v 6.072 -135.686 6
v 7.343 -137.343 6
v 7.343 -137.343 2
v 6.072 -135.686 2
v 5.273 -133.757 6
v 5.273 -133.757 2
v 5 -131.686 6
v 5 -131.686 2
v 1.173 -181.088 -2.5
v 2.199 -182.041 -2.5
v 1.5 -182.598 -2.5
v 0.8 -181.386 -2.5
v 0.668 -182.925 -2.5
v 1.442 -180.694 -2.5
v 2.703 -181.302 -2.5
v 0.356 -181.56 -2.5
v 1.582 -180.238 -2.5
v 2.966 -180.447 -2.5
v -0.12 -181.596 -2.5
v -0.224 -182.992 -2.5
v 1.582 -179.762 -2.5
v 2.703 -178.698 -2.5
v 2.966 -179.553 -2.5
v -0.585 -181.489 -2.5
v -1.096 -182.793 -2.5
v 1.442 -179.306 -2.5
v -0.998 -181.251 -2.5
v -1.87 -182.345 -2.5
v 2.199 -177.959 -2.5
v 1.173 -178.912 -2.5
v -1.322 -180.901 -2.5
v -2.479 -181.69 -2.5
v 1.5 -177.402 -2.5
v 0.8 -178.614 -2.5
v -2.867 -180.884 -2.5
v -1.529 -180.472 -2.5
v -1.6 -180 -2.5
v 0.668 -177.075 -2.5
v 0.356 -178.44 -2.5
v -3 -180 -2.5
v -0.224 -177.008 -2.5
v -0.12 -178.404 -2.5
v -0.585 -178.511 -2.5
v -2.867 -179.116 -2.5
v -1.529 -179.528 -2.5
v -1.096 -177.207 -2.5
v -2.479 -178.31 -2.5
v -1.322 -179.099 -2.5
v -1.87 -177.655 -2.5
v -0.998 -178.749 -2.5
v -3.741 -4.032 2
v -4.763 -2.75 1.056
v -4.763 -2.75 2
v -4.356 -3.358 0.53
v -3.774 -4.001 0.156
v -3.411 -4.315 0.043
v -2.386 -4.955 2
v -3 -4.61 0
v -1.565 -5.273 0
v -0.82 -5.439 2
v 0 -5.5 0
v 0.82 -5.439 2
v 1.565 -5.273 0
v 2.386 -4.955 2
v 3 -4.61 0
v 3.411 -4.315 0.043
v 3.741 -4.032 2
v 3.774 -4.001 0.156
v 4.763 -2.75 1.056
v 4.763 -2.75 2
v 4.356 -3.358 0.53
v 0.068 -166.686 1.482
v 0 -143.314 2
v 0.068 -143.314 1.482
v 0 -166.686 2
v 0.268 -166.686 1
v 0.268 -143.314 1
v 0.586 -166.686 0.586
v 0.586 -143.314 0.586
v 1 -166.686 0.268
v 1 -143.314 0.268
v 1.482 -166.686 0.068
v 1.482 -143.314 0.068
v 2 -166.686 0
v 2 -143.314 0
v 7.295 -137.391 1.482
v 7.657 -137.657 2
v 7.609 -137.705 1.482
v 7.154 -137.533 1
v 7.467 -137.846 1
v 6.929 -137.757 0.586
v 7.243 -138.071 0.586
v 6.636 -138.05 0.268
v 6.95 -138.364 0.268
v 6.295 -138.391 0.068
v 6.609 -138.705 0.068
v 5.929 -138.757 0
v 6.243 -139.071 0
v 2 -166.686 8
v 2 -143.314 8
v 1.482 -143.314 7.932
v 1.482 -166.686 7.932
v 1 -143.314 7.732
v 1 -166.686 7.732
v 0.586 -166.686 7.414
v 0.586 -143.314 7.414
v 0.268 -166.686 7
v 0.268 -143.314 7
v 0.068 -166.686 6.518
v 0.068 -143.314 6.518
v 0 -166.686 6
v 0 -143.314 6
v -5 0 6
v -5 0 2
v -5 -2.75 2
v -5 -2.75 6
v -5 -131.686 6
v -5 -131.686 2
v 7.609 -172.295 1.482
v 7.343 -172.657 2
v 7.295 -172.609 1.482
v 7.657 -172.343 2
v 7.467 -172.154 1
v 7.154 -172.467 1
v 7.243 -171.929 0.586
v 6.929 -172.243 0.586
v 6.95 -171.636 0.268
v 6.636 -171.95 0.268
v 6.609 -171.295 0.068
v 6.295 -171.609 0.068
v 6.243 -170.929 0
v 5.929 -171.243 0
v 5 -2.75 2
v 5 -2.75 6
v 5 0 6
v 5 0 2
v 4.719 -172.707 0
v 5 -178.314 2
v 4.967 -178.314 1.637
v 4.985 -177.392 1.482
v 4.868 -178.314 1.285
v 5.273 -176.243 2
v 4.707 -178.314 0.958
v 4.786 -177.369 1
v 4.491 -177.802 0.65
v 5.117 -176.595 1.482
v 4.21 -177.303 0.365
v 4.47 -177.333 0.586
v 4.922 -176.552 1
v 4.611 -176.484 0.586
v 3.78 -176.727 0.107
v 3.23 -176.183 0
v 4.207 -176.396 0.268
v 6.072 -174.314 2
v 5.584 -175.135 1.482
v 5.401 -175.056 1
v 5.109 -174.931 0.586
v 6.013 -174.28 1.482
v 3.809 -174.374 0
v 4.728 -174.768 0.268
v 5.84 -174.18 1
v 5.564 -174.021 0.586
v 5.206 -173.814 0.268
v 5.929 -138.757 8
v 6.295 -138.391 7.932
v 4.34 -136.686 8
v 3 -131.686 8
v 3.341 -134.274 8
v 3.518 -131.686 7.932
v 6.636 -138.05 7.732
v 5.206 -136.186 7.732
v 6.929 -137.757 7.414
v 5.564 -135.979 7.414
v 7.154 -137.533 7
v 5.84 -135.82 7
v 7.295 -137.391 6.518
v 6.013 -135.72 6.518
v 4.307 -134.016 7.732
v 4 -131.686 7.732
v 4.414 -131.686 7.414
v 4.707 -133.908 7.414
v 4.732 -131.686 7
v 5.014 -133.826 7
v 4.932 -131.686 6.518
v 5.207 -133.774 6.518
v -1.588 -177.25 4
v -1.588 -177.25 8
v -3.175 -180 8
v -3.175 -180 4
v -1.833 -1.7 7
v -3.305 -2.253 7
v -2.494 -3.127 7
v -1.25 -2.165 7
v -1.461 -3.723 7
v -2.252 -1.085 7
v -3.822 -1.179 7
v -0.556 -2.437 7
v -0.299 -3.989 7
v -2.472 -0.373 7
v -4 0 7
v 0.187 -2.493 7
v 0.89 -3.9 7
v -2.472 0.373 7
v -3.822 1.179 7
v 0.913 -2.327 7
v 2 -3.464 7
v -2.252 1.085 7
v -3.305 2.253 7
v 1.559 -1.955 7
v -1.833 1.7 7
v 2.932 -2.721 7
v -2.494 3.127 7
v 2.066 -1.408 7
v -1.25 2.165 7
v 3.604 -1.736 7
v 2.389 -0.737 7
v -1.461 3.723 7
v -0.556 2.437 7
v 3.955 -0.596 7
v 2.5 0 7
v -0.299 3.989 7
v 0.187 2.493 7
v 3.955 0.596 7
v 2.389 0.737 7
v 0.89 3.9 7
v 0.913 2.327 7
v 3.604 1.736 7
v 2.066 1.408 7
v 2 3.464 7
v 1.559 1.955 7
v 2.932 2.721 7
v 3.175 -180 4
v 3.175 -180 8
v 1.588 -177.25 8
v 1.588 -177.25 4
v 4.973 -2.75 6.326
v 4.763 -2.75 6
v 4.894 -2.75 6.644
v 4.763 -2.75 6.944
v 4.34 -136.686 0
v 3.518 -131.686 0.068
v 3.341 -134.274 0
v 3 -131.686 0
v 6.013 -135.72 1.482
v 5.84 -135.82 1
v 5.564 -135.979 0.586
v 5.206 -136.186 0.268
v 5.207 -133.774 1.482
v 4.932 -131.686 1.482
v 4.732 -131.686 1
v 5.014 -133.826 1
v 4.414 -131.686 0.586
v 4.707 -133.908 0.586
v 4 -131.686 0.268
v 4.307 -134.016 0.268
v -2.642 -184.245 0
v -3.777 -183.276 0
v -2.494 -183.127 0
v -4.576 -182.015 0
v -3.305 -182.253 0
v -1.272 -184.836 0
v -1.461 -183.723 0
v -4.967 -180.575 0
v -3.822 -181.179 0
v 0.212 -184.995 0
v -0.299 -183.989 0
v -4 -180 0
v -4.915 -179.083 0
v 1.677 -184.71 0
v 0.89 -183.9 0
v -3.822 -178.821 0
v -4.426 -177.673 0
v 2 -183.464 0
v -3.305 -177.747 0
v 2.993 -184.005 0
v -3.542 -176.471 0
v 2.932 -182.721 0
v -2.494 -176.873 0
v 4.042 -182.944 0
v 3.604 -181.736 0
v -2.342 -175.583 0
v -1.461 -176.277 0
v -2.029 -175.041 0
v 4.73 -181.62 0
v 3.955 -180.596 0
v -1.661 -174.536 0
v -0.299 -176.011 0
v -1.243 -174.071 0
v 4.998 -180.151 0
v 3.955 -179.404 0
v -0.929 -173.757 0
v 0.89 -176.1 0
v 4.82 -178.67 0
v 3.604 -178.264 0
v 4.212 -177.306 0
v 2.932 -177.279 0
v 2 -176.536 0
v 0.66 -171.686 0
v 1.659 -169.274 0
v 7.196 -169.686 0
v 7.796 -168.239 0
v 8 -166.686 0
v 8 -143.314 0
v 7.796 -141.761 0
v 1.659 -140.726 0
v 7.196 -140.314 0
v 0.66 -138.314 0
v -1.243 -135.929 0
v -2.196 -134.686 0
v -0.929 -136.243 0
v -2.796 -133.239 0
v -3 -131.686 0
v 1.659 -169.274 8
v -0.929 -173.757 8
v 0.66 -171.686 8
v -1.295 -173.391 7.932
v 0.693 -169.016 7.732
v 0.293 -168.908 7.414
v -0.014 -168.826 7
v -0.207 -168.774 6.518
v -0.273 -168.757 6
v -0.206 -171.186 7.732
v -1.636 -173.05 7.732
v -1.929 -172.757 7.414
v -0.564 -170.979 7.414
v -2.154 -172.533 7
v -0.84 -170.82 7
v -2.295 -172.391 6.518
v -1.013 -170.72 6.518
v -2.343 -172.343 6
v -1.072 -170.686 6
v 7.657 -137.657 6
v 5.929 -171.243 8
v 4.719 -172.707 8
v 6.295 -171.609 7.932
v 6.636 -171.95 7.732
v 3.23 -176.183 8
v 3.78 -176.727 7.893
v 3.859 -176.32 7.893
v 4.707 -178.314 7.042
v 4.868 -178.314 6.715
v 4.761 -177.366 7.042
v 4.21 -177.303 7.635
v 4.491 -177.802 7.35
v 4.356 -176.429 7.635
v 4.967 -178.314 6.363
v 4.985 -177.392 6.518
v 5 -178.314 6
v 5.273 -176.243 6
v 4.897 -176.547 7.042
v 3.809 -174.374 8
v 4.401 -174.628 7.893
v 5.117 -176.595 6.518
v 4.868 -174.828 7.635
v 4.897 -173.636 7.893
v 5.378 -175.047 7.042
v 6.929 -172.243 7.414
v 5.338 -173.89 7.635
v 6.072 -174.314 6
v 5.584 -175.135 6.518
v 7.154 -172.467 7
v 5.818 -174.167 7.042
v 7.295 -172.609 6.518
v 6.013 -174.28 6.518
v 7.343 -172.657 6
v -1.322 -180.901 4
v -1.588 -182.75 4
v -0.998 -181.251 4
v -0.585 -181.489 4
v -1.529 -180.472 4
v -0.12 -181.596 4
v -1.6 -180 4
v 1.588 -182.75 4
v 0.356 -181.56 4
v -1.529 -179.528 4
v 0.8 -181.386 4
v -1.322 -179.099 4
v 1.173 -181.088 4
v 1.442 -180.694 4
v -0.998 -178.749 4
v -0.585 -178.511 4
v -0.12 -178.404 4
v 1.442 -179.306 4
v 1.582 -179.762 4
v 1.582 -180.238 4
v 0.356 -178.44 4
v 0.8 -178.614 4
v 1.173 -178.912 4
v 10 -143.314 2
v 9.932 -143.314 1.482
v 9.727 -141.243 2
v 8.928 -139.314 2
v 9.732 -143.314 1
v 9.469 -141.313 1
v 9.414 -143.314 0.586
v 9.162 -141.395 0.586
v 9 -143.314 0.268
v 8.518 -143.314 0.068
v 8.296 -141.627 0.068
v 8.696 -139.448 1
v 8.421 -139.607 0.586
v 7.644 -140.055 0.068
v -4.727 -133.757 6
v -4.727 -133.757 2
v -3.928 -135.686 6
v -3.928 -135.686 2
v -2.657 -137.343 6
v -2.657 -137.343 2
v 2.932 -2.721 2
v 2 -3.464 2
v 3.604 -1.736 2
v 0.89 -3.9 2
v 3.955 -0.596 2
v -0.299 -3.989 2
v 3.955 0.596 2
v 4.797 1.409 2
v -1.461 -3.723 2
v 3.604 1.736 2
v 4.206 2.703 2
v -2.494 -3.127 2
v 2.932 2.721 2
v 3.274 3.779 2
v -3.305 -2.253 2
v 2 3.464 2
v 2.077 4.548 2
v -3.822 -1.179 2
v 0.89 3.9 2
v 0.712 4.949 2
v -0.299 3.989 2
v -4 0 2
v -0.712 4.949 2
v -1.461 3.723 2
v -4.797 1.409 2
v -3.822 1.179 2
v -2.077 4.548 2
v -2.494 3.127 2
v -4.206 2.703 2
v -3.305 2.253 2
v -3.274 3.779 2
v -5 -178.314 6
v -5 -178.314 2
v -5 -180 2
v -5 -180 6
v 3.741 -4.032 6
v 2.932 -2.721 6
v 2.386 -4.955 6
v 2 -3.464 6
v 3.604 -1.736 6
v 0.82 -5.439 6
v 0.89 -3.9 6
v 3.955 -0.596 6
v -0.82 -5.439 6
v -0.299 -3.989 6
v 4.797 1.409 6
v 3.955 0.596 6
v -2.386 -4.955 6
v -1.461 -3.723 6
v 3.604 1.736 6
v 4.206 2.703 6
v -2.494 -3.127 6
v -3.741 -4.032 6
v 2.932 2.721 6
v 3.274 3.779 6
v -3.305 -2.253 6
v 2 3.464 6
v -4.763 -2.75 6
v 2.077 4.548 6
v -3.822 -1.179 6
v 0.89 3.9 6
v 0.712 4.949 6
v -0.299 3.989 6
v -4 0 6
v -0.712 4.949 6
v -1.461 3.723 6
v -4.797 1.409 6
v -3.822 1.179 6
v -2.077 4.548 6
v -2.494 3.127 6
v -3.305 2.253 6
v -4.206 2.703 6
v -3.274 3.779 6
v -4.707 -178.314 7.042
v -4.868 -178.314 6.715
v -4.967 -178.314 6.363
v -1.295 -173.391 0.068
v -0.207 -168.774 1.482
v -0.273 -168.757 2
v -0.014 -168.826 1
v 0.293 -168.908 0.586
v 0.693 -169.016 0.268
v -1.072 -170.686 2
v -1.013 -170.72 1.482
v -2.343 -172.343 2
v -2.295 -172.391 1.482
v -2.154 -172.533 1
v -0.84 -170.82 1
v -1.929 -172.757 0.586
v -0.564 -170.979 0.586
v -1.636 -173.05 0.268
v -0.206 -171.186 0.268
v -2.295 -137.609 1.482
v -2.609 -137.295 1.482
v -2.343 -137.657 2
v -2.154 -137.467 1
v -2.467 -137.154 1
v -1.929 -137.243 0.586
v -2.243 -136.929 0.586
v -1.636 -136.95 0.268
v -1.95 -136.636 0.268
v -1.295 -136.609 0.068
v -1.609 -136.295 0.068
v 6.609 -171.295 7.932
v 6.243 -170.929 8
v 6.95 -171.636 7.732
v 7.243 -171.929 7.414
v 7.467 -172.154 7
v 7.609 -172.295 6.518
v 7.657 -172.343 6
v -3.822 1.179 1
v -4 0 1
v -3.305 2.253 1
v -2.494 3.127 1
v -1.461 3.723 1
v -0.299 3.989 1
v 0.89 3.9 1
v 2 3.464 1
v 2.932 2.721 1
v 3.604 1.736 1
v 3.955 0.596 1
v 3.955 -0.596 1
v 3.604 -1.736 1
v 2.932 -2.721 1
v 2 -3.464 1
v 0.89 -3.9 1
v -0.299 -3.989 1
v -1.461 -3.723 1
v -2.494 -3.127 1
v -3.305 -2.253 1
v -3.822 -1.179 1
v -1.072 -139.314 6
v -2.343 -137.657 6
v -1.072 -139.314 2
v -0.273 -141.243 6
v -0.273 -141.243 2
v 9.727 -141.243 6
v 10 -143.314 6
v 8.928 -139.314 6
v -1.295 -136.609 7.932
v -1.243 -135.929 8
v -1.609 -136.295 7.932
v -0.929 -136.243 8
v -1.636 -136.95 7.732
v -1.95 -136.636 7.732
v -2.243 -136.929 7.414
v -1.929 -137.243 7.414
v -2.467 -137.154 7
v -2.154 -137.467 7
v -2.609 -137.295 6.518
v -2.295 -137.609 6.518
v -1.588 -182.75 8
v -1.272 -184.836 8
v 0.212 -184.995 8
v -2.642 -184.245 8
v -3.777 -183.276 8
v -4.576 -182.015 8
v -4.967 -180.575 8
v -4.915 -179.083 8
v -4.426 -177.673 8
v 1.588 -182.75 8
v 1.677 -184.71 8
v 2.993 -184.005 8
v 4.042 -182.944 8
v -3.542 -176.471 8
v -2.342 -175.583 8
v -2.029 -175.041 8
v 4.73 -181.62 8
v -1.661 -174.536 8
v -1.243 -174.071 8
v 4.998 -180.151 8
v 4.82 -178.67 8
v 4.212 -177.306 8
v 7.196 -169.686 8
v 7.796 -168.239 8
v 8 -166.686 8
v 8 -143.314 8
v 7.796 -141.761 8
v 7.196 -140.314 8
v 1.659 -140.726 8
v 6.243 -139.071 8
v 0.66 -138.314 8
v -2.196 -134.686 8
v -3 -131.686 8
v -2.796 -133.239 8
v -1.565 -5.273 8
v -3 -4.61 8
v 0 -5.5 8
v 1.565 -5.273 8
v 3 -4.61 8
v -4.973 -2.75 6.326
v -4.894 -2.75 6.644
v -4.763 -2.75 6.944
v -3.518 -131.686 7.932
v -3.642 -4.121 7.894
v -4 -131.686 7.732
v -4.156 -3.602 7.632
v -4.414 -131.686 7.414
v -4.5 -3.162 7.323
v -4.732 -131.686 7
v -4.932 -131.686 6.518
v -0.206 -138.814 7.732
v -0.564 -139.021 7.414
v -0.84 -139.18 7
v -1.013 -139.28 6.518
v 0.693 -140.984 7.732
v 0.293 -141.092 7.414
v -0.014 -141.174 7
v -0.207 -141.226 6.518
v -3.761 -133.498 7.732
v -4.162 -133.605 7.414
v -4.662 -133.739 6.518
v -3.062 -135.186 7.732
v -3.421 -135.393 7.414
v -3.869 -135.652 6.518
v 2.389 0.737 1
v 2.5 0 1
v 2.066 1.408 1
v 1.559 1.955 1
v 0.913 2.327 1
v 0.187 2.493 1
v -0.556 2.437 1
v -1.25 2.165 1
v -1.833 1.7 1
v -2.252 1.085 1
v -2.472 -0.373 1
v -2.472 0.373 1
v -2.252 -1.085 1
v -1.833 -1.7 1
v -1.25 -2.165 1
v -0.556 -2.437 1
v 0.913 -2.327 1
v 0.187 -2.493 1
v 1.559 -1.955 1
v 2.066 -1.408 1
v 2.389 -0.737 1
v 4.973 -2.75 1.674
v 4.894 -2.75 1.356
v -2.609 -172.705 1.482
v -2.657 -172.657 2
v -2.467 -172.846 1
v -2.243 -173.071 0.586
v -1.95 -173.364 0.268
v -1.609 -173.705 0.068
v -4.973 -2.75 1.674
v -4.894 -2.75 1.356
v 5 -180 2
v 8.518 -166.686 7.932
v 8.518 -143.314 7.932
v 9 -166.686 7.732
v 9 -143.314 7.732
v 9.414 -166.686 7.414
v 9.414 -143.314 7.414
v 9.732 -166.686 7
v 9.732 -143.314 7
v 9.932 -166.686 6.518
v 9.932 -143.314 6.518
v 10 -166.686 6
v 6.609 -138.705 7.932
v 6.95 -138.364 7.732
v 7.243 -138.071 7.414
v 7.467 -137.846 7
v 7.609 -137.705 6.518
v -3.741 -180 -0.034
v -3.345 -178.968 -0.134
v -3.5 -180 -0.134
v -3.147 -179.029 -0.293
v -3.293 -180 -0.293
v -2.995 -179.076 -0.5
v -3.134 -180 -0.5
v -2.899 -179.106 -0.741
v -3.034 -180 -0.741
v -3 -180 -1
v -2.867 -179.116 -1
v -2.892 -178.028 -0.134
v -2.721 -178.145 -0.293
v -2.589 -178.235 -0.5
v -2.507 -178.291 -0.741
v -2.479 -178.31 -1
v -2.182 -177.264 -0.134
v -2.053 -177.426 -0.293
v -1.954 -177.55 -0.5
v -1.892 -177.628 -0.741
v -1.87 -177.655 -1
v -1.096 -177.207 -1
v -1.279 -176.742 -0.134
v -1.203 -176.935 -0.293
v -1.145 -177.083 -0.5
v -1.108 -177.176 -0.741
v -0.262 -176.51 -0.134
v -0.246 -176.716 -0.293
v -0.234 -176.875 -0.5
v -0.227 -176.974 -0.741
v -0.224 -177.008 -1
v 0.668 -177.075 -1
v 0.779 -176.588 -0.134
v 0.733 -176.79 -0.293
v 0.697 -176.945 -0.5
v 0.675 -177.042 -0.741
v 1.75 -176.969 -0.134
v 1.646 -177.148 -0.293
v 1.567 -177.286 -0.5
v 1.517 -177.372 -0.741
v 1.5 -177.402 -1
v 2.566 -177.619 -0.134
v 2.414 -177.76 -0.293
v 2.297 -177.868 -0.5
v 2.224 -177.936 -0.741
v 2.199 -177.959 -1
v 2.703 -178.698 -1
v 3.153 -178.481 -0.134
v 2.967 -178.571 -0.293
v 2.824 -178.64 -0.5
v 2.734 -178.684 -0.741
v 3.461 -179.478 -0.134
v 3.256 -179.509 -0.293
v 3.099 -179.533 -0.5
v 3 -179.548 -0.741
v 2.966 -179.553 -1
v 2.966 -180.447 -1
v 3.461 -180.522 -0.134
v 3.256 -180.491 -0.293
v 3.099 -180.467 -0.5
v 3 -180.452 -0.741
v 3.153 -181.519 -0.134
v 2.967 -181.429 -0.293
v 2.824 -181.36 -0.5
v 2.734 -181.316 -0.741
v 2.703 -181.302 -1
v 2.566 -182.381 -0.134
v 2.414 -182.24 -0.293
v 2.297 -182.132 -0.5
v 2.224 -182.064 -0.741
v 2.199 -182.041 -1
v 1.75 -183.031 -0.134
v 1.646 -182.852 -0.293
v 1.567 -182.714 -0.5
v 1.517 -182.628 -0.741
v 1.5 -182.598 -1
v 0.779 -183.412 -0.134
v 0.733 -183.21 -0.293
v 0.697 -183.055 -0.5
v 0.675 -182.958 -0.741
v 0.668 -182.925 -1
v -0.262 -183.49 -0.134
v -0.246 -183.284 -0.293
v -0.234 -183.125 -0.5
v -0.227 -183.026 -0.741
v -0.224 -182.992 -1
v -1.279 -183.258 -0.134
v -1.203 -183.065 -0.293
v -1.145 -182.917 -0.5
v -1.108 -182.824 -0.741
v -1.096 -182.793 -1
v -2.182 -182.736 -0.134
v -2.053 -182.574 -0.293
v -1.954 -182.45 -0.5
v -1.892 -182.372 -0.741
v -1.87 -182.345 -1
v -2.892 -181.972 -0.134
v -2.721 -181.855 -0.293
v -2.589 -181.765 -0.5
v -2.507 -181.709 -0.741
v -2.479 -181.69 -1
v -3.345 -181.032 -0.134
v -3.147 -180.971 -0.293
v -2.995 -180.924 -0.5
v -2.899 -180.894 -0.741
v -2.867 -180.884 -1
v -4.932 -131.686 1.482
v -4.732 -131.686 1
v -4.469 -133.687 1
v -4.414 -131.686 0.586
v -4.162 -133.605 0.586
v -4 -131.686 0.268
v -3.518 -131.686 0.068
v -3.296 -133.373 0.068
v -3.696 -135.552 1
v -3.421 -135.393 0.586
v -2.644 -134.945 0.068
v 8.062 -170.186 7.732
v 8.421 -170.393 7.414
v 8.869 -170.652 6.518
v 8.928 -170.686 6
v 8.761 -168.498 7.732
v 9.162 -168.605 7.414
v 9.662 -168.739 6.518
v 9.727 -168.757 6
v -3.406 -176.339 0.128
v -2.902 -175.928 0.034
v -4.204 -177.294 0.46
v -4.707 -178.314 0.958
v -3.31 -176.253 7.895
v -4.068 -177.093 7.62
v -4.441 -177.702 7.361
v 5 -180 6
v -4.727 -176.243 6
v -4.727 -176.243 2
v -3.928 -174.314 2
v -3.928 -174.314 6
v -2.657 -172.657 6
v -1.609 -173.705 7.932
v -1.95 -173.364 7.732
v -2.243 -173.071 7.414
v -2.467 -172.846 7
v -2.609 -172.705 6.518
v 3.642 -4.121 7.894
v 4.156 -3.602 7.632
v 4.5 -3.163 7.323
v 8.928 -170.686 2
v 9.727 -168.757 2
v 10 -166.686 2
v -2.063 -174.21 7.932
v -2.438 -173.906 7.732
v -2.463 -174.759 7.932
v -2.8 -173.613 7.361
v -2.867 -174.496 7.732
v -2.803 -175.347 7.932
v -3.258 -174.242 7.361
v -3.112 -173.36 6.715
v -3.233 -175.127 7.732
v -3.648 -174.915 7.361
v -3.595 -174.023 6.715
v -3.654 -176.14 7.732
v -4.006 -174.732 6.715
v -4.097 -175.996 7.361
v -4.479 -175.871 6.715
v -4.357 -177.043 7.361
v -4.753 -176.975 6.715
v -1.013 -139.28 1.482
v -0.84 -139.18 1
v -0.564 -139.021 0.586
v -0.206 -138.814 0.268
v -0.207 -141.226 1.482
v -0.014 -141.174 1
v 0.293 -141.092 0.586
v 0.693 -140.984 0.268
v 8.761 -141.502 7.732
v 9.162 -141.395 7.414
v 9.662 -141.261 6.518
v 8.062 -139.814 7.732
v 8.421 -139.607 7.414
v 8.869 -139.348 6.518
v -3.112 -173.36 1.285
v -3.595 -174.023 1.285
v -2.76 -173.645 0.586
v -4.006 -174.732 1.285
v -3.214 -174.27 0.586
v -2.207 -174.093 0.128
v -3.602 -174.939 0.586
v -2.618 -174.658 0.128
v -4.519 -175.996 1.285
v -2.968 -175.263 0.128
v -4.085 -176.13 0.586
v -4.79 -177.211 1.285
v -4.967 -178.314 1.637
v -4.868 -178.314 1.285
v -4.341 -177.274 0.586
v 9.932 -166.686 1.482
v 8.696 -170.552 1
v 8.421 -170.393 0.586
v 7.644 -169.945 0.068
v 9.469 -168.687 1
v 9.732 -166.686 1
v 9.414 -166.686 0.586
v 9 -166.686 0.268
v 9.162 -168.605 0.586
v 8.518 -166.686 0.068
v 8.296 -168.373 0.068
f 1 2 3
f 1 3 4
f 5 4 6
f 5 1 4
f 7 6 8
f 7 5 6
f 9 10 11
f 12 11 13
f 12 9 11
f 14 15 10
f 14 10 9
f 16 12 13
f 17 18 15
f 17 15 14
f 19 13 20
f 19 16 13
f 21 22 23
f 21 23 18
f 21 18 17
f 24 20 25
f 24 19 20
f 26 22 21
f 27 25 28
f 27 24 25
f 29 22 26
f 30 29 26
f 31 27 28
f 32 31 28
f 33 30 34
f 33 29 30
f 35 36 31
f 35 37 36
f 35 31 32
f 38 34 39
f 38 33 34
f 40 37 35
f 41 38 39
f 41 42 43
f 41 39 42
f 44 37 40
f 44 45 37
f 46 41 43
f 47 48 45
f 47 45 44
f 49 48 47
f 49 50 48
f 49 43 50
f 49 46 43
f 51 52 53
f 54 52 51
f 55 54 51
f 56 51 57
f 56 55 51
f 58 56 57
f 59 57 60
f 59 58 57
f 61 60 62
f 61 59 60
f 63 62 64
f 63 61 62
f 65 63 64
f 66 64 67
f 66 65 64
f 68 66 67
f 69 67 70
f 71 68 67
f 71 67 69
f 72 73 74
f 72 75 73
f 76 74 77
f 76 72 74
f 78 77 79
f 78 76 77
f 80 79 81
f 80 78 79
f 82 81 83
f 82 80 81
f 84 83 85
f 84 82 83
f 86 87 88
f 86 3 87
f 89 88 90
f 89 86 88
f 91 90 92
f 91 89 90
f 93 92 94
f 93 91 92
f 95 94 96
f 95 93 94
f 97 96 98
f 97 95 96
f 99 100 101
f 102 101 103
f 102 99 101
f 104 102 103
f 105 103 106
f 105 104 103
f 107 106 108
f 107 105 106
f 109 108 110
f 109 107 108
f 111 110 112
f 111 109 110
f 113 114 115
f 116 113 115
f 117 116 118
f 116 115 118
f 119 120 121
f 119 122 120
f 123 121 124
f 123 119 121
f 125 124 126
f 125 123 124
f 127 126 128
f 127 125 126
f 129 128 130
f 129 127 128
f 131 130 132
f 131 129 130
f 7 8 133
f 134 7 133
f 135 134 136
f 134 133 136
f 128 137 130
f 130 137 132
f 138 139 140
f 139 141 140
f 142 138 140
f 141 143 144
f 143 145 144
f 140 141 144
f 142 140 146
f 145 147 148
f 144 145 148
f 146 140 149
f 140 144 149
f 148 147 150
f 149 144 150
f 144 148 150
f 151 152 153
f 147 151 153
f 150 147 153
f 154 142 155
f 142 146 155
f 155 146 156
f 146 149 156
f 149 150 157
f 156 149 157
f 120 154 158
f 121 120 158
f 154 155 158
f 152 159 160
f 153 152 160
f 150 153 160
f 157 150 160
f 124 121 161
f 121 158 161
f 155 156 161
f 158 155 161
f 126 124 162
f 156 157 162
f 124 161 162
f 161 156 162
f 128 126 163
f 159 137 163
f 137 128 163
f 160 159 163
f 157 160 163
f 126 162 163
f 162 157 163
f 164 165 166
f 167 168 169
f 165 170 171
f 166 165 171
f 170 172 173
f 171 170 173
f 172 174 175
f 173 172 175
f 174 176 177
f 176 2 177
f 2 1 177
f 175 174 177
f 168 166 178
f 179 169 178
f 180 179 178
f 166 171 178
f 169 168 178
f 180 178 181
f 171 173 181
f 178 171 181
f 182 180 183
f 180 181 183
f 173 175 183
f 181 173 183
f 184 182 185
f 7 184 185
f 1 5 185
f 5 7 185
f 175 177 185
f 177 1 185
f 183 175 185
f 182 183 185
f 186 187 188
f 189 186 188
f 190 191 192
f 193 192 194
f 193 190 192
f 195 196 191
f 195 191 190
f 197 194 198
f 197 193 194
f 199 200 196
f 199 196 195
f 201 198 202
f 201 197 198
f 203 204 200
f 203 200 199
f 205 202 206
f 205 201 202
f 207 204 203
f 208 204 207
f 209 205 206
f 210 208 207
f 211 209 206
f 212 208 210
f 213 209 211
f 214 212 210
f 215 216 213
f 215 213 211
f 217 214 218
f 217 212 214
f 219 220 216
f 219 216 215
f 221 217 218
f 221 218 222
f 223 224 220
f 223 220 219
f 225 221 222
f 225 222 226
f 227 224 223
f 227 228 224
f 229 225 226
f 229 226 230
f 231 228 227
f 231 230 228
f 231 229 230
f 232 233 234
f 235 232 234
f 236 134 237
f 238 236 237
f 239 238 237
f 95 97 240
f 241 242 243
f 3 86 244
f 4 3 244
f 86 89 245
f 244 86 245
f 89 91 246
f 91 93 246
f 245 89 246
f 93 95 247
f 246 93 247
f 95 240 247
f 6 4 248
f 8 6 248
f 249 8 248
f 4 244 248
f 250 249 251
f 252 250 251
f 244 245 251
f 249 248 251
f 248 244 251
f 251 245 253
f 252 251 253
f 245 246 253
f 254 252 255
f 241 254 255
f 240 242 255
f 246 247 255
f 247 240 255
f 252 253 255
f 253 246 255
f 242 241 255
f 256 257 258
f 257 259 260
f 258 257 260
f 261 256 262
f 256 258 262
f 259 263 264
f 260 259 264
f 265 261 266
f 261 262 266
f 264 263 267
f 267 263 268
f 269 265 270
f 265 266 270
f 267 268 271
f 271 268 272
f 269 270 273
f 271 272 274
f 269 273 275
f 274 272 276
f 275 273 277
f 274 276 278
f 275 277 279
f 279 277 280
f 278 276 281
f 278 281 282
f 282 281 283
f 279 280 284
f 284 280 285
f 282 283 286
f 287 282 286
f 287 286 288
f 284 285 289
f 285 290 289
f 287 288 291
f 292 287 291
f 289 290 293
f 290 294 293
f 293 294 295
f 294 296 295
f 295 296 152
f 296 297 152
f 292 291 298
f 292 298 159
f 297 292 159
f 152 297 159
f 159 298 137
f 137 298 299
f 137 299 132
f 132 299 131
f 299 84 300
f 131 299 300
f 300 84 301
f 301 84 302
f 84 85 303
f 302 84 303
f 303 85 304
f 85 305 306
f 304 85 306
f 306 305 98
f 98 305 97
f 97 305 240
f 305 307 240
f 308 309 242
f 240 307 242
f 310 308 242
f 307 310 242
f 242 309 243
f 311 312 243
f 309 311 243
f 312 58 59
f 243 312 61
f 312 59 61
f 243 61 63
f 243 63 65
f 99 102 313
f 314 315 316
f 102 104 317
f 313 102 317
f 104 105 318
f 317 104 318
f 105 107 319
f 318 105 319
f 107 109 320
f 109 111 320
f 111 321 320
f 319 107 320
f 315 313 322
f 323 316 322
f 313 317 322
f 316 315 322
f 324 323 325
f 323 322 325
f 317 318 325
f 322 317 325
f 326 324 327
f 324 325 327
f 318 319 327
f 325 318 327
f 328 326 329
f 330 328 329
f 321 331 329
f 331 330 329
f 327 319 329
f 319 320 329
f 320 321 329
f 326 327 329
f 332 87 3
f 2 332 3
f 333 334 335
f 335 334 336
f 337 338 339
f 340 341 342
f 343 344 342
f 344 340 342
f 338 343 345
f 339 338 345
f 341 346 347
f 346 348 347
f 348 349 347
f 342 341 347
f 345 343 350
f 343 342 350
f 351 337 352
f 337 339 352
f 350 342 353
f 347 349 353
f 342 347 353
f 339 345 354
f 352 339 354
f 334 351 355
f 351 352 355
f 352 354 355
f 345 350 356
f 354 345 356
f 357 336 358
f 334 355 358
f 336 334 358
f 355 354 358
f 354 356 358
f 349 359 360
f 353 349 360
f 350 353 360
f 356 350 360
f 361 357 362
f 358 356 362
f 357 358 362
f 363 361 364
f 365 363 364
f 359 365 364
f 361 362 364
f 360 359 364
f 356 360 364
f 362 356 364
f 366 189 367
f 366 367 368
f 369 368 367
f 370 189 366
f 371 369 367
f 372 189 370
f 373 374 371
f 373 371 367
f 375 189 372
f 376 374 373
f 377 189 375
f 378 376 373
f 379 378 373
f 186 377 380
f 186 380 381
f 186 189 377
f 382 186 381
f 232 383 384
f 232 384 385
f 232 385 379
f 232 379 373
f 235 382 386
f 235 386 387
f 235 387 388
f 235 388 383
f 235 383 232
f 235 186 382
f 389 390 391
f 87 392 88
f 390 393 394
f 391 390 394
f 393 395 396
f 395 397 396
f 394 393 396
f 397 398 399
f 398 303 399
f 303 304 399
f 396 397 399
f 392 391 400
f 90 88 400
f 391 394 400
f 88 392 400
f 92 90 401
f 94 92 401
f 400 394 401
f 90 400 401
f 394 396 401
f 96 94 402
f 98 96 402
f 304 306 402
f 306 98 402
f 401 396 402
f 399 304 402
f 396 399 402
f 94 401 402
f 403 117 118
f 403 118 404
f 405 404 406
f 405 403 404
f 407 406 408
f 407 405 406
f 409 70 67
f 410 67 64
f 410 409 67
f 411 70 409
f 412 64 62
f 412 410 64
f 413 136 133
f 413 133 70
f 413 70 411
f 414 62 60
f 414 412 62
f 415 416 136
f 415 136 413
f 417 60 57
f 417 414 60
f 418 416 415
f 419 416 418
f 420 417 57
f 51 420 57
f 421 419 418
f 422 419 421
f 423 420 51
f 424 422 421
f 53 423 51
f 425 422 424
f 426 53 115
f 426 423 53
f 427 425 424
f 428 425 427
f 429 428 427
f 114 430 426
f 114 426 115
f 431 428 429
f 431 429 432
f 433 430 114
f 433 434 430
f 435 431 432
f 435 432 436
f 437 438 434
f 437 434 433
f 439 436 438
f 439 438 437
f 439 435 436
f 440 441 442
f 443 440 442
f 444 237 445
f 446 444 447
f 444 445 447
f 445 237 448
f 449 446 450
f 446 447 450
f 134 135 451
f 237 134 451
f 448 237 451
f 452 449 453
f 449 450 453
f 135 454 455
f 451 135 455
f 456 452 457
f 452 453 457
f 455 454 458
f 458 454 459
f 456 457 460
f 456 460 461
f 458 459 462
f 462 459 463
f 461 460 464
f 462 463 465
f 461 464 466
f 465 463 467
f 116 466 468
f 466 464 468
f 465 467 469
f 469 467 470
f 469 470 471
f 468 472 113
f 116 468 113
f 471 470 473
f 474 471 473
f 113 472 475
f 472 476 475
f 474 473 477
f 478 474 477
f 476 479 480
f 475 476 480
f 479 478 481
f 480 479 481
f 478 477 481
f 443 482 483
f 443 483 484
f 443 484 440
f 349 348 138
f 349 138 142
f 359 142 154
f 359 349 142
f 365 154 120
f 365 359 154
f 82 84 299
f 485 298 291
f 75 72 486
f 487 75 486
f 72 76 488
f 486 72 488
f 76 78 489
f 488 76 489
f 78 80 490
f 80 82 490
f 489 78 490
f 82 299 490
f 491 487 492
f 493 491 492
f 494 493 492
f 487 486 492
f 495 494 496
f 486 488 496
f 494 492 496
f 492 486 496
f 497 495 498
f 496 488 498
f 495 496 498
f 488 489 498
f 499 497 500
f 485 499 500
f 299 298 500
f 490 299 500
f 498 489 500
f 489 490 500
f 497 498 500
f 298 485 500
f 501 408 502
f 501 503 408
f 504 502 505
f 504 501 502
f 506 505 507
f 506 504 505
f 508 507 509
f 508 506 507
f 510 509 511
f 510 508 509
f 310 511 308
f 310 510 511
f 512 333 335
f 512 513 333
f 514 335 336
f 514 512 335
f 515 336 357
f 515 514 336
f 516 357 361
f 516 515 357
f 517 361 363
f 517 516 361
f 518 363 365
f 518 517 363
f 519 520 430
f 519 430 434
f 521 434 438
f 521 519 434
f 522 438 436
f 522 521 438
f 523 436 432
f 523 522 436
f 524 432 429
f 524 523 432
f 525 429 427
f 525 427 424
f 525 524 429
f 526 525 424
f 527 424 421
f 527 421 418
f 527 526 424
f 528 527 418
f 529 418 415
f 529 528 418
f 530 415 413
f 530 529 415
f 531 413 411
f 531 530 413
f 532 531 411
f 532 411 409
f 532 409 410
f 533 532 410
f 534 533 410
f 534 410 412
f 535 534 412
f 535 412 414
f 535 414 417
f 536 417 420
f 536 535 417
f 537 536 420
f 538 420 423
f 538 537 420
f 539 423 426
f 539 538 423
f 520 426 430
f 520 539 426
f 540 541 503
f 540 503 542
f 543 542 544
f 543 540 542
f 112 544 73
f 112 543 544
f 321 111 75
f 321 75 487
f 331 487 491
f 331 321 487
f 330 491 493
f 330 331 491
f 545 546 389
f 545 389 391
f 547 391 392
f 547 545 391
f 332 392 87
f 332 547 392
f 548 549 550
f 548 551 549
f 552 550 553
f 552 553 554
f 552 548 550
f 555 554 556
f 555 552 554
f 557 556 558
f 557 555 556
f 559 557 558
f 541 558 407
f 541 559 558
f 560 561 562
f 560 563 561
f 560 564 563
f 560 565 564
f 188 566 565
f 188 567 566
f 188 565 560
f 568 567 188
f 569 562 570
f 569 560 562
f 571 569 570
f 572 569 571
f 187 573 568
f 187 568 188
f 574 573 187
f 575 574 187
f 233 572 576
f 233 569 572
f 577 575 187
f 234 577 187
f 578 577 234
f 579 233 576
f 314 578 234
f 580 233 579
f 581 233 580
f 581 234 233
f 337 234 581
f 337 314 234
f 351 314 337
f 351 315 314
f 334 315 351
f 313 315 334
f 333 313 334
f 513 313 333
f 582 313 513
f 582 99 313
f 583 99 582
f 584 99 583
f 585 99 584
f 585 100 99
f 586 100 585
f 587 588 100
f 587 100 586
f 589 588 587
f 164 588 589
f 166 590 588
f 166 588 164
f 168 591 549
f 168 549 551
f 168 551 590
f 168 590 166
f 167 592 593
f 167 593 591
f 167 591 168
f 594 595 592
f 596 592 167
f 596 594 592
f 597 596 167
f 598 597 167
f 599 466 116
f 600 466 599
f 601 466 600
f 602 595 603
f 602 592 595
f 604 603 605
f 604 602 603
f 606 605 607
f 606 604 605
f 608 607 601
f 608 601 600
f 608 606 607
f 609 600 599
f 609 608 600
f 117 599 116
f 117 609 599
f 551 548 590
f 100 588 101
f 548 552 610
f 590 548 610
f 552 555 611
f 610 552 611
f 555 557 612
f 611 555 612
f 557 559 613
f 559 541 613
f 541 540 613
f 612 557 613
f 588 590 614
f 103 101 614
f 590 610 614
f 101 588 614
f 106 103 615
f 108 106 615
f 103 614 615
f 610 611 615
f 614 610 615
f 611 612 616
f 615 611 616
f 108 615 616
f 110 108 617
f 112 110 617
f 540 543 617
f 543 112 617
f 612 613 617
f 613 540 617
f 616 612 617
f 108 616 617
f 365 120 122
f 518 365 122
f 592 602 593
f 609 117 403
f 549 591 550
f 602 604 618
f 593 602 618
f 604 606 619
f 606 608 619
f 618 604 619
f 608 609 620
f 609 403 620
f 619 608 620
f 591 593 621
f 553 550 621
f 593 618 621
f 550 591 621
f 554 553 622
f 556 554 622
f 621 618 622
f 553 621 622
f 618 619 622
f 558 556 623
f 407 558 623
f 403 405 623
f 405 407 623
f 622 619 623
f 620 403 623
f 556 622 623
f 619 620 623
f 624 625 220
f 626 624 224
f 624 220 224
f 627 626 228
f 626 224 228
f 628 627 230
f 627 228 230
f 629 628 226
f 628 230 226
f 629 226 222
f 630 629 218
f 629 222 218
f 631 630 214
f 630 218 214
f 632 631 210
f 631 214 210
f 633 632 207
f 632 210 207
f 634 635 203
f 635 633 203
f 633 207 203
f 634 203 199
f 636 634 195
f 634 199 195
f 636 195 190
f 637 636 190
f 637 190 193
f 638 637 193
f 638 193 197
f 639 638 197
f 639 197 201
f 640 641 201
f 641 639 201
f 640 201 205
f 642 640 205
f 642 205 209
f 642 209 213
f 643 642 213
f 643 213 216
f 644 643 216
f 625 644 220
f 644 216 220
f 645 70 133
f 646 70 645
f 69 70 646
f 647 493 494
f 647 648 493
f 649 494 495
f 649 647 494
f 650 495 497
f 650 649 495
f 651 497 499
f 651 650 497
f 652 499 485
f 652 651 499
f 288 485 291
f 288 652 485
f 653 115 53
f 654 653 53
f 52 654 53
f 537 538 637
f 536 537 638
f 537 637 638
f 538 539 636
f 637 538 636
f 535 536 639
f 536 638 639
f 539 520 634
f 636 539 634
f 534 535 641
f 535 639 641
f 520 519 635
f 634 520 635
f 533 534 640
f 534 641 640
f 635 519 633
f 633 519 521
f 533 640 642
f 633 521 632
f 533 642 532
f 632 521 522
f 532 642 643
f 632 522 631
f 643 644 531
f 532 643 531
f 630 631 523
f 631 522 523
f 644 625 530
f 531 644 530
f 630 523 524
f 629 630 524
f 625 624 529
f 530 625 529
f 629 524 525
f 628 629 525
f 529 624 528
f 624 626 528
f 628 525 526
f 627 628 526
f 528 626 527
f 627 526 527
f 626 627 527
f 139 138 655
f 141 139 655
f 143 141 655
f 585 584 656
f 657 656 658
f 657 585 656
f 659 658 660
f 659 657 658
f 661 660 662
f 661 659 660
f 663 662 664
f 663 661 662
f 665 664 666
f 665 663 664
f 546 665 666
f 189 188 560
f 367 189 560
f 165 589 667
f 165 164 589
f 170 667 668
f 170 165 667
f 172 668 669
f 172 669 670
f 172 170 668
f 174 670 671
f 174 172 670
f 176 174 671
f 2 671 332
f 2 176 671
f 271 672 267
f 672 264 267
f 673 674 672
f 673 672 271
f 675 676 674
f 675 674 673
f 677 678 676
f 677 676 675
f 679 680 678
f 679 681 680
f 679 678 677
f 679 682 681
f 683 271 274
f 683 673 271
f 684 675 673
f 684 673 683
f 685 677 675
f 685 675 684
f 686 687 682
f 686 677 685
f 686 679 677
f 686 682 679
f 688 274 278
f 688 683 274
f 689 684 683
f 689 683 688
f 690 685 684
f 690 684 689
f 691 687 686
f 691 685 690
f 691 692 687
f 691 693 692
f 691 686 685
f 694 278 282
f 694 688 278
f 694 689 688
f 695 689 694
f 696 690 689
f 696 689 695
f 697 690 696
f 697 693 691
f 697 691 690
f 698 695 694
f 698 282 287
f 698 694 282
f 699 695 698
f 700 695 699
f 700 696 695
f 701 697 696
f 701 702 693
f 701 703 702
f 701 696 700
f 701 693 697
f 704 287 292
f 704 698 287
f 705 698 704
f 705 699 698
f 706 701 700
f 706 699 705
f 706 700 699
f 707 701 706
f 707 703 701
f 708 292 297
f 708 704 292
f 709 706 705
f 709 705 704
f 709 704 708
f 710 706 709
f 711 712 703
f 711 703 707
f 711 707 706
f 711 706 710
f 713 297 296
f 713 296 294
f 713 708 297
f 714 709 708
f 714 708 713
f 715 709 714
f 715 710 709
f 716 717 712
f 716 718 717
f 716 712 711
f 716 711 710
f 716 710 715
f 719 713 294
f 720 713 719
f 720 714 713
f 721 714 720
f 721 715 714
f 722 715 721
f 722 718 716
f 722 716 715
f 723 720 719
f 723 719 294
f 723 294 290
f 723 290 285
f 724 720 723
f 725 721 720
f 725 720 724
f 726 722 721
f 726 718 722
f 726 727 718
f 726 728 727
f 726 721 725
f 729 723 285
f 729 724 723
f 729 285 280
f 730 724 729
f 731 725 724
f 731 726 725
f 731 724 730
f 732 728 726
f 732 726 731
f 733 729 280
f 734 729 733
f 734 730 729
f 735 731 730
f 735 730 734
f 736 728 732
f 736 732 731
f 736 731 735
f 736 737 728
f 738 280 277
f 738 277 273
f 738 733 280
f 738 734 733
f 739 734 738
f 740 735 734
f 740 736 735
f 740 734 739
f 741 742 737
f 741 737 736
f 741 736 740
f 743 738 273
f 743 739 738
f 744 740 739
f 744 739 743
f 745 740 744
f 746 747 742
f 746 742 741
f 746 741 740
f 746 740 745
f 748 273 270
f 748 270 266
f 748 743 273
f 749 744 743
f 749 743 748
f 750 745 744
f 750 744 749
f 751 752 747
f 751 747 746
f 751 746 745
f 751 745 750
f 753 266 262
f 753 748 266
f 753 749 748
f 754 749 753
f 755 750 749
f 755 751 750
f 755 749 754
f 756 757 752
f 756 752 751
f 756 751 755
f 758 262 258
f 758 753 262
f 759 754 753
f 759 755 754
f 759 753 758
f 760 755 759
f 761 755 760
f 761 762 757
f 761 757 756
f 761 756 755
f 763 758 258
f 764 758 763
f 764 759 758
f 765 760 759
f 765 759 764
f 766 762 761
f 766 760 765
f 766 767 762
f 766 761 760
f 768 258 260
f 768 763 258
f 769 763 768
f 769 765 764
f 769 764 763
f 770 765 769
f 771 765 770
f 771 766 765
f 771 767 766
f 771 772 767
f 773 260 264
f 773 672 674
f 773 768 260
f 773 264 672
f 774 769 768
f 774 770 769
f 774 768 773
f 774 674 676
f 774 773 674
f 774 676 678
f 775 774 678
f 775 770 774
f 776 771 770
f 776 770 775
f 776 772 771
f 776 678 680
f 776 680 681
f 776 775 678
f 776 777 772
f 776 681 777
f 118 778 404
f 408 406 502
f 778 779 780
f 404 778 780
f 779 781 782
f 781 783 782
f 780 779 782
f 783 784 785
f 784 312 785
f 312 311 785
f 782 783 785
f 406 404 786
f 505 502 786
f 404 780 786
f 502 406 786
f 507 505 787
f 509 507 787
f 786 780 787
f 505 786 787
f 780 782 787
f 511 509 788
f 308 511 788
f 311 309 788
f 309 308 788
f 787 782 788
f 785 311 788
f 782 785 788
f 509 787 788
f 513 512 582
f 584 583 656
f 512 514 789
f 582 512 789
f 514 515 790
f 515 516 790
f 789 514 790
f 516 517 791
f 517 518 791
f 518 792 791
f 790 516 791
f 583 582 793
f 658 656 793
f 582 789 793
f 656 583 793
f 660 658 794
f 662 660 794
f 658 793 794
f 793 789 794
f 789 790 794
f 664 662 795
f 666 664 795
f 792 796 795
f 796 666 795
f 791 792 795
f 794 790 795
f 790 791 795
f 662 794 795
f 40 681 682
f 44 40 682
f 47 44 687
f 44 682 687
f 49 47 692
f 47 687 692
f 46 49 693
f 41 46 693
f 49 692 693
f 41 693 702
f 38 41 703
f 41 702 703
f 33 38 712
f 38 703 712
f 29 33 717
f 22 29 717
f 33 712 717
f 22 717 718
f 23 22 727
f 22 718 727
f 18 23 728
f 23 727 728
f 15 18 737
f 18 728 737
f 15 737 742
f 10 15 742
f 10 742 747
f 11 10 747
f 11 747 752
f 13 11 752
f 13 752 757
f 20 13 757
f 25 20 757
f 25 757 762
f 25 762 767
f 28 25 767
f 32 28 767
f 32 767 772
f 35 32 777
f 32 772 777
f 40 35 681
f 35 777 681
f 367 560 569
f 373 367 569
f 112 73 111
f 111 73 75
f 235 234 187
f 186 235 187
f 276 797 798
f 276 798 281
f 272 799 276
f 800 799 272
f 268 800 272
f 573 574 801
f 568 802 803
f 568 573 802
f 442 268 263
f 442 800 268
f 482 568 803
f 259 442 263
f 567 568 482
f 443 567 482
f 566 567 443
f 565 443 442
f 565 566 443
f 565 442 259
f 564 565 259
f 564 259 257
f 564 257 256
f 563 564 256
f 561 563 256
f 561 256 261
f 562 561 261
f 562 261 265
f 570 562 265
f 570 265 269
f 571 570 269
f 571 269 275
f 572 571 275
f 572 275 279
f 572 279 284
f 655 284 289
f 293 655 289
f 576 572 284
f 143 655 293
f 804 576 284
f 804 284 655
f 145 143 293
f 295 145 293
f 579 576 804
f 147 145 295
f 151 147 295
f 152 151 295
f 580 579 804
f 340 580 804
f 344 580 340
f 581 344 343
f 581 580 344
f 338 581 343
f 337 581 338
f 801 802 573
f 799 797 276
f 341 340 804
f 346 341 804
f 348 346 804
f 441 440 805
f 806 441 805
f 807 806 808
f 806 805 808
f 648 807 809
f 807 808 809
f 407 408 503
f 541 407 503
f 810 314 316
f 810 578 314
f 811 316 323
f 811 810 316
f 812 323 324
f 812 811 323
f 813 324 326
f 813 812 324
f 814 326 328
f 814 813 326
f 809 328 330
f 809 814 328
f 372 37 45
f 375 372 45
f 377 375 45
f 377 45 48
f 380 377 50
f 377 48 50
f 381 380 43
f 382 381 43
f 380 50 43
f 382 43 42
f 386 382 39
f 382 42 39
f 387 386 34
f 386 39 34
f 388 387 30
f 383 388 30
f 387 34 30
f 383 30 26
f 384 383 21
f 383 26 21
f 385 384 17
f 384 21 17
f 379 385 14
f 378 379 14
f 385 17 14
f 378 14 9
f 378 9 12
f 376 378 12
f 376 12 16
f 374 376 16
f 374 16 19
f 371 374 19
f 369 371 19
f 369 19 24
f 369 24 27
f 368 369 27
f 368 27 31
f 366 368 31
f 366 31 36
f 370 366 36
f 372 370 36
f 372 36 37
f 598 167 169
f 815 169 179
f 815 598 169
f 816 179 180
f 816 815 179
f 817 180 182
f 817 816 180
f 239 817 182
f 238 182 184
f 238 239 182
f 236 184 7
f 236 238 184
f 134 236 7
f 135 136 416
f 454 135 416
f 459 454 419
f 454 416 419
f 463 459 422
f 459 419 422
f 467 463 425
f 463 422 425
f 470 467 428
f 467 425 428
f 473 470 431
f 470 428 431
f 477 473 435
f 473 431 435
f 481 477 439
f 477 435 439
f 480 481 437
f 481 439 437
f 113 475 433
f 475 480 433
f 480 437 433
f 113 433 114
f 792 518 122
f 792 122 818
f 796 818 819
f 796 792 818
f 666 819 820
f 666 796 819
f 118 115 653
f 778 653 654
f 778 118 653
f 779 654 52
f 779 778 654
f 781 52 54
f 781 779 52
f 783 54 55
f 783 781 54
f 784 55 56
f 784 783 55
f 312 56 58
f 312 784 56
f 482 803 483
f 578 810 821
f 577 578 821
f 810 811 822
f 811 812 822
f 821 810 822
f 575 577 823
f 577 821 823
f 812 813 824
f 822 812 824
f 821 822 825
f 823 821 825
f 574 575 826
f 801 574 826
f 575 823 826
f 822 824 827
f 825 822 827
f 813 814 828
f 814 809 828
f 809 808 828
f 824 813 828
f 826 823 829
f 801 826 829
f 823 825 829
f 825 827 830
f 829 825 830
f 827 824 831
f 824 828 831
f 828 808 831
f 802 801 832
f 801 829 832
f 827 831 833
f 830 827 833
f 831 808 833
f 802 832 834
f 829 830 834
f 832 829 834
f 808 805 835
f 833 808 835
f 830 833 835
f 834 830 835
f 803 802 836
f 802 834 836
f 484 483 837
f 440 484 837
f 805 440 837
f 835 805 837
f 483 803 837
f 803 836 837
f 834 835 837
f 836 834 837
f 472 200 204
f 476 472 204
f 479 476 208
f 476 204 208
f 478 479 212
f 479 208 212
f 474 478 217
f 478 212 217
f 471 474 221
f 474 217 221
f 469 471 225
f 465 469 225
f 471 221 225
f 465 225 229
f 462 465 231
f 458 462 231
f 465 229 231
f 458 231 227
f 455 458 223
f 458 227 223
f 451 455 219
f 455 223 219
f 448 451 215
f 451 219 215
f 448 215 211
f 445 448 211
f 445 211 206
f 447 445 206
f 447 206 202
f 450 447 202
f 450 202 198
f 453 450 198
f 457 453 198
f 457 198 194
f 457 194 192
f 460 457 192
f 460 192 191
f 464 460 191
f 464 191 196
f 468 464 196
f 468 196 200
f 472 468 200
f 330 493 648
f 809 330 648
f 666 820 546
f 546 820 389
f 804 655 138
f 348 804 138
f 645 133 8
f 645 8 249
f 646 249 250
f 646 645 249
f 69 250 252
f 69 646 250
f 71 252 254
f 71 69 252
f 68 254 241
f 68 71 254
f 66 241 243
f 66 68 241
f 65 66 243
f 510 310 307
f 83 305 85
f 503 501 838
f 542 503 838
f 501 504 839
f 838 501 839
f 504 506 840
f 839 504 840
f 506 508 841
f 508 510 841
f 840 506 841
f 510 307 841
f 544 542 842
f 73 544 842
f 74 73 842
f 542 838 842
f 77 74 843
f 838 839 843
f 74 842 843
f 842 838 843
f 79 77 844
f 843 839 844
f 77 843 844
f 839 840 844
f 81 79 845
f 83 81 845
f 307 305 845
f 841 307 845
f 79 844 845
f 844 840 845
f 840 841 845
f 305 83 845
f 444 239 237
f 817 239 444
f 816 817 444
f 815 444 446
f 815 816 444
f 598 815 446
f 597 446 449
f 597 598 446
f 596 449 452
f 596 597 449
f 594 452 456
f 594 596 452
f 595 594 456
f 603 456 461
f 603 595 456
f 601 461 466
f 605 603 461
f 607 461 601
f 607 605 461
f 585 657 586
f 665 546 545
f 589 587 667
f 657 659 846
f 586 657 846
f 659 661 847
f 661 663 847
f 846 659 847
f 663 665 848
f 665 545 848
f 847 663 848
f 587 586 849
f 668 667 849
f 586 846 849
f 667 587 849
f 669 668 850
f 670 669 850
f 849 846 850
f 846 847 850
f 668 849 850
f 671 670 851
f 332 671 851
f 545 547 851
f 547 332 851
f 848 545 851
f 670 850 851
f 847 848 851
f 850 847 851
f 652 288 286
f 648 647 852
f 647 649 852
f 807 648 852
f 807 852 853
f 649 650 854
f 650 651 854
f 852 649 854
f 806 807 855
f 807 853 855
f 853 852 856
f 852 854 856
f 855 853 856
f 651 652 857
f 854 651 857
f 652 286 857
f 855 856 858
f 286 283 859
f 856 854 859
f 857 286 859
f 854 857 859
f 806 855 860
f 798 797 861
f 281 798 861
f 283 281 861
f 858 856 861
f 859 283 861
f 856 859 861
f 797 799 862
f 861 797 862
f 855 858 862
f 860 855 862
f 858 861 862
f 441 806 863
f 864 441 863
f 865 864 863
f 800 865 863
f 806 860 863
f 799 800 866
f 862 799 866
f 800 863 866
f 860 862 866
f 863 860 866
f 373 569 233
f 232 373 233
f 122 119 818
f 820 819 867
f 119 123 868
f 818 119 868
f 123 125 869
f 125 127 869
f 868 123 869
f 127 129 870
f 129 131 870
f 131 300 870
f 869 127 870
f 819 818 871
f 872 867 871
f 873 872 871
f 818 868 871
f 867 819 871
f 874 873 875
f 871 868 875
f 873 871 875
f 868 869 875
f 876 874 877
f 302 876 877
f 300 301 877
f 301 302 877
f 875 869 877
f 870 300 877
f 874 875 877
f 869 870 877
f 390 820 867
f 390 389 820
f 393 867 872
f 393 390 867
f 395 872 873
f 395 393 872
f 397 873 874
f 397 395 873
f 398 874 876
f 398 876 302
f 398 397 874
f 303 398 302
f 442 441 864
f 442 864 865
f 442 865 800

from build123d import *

# Parameters (mm, degrees)
EXTRUDE_1_DEPTH     = 8
FILLET_1_R          = 8
CUT_EXTRUDE_1_DEPTH = 1
SKETCH_3_R          = 2.5
EXTRUDE_2_DEPTH     = 4
SKETCH_4_R          = 4
CUT_EXTRUDE_3_DEPTH = 1
CUT_EXTRUDE_4_REACH = 13
SKETCH_5_R          = 2.5
CUT_EXTRUDE_START   = -7
SKETCH_4_2_R        = 4
CUT_EXTRUDE_5_DEPTH = 2
SKETCH_7_R          = 4
CUT_EXTRUDE_6_DEPTH = 1
FILLET_2_R          = 2
SKETCH_9_R          = 5
EXTRUDE_3_DEPTH     = 8
SKETCH_11_R         = 3
EXTRUDE_4_DEPTH     = 2.5
FILLET_3_R          = 1
SKETCH_12_R         = 1.6
CUT_EXTRUDE_8_DEPTH = 12
CUT_EXTRUDE_9_DEPTH = 4


with BuildPart() as part:
    # 草图1 → 凸台-拉伸1 (new body)
    with BuildSketch(Plane.XY):
        with BuildLine():
            Line((-5, -175), (-5, -180))
            ThreePointArc((-5, -180), (0, -185), (5, -180))
            Line((5, -180), (5, -175))
            Line((5, -175), (10, -170))
            Line((10, -170), (10, -140))
            Line((10, -140), (5, -135))
            Line((5, -135), (5, 0))
            ThreePointArc((5, 0), (0, 5), (-5, 0))
            Line((-5, 0), (-5, -135))
            Line((-5, -135), (0, -140))
            Line((0, -140), (0, -170))
            Line((0, -170), (-5, -175))
        make_face()
    extrude(amount=EXTRUDE_1_DEPTH)

    # 圆角1
    fillet_1_edges = [part.edges().sort_by_distance(p)[0] for p in [
        (5, -175, 4),
        (-5, -175, 4),
        (0, -170, 4),
        (0, -140, 4),
        (-5, -135, 4),
        (5, -135, 4),
        (10, -140, 4),
        (10, -170, 4),
    ]]
    fillet(fillet_1_edges, radius=FILLET_1_R)

    # 草图2 → 切除-拉伸1 (cut)
    with BuildSketch(Plane(origin=(0, 0, 0), x_dir=(-1, 0, 0), z_dir=(0, 0, -1))):
        with BuildLine():
            Line((5, 0), (5, -2.75))
            Line((5, -2.75), (4.763139721, -2.75))
            ThreePointArc((4.763139721, -2.75), (0, -5.5), (-4.763139721, -2.75))
            Line((-4.763139721, -2.75), (-5, -2.75))
            Line((-5, -2.75), (-5, 0))
            ThreePointArc((-5, 0), (0, 5), (5, 0))
        make_face()
    extrude(amount=-CUT_EXTRUDE_1_DEPTH, mode=Mode.SUBTRACT)

    # 草图3 → 凸台-拉伸2 (add)
    with BuildSketch(Plane(origin=(0, 0, 1), x_dir=(-1, 0, 0), z_dir=(0, 0, -1))):
        Circle(SKETCH_3_R)
    extrude(amount=EXTRUDE_2_DEPTH)

    # 草图4 → 切除-拉伸3 (cut)
    with BuildSketch(Plane(origin=(0, 0, 1), x_dir=(-1, 0, 0), z_dir=(0, 0, -1))):
        with BuildLine():
            Line((-5, 0), (-5, -2.75))
            Line((-5, -2.75), (-4.763139721, -2.75))
            ThreePointArc((-4.763139721, -2.75), (0, -5.5), (4.763139721, -2.75))
            Line((4.763139721, -2.75), (5, -2.75))
            Line((5, -2.75), (5, 0))
            ThreePointArc((5, 0), (0, 5), (-5, 0))
        make_face()
        Circle(SKETCH_4_R, mode=Mode.SUBTRACT)
    extrude(amount=-CUT_EXTRUDE_3_DEPTH, mode=Mode.SUBTRACT)

    # 草图5 → 切除-拉伸4 (cut, up to next)
    with BuildSketch(Plane.XY.offset(8), mode=Mode.PRIVATE) as cut_extrude_4_sk1:
        Circle(SKETCH_5_R)
    cut_extrude_4_tool1 = extrude(cut_extrude_4_sk1.sketch, amount=-CUT_EXTRUDE_4_REACH, mode=Mode.PRIVATE) & part.part
    add(cut_extrude_4_tool1.solids().sort_by_distance((0, 0, 8))[0], mode=Mode.SUBTRACT)

    # 草图4<2> → 切除-拉伸5 (cut)
    with BuildSketch(Plane(origin=(0, 0, 1), x_dir=(-1, 0, 0), z_dir=(0, 0, -1)).offset(CUT_EXTRUDE_START)):
        with BuildLine():
            Line((-5, 0), (-5, -2.75))
            Line((-5, -2.75), (-4.763139721, -2.75))
            ThreePointArc((-4.763139721, -2.75), (0, -5.5), (4.763139721, -2.75))
            Line((4.763139721, -2.75), (5, -2.75))
            Line((5, -2.75), (5, 0))
            ThreePointArc((5, 0), (0, 5), (-5, 0))
        make_face()
        Circle(SKETCH_4_2_R, mode=Mode.SUBTRACT)
    extrude(amount=CUT_EXTRUDE_5_DEPTH, mode=Mode.SUBTRACT)

    # 草图7 → 切除-拉伸6 (cut)
    with BuildSketch(Plane.XY.offset(8)):
        Circle(SKETCH_7_R)
    extrude(amount=-CUT_EXTRUDE_6_DEPTH, mode=Mode.SUBTRACT)

    # 圆角2
    fillet_2_edges = [part.edges().sort_by_distance(p)[0] for p in [
        (-4.39103626, -134.74775896, 0),
        (-2.5, -137.5, 0),
        (-0.60896374, -140.25224104, 0),
        (0, -155, 0),
        (-0.60896374, -169.74775896, 0),
        (-2.5, -172.5, 0),
        (-4.39103626, -175.25224104, 0),
        (-5, -179.156854249, 0),
        (0, -185, 0),
        (5, -179.156854249, 0),
        (5.60896374, -175.25224104, 0),
        (7.5, -172.5, 0),
        (9.39103626, -169.74775896, 0),
        (10, -155, 0),
        (9.39103626, -140.25224104, 0),
        (7.5, -137.5, 0),
        (5.60896374, -134.74775896, 0),
        (-4.39103626, -134.74775896, 8),
        (-2.5, -137.5, 8),
        (-0.60896374, -140.25224104, 8),
        (0, -155, 8),
        (-0.60896374, -169.74775896, 8),
        (-2.5, -172.5, 8),
        (-4.39103626, -175.25224104, 8),
        (-5, -179.156854249, 8),
        (0, -185, 8),
        (5, -179.156854249, 8),
        (5.60896374, -175.25224104, 8),
        (7.5, -172.5, 8),
        (9.39103626, -169.74775896, 8),
        (10, -155, 8),
        (9.39103626, -140.25224104, 8),
        (7.5, -137.5, 8),
        (5.60896374, -134.74775896, 8),
        (-5, -67.218145751, 0),
        (5, -67.218145751, 0),
        (-5, -67.218145751, 8),
        (5, -67.218145751, 8),
    ]]
    fillet(fillet_2_edges, radius=FILLET_2_R)

    # 草图9 → 凸台-拉伸3 (add)
    with BuildSketch(Plane.XY.offset(8)):
        with Locations((0, -180)):
            Circle(SKETCH_9_R)
    extrude(amount=-EXTRUDE_3_DEPTH)

    # 草图11 → 凸台-拉伸4 (add)
    with BuildSketch(Plane(origin=(0, 0, 0), x_dir=(-1, 0, 0), z_dir=(0, 0, -1))):
        with Locations((0, -180)):
            Circle(SKETCH_11_R)
    extrude(amount=EXTRUDE_4_DEPTH)

    # 圆角3
    fillet_3_edges = [part.edges().sort_by_distance(p)[0] for p in [
        (3, -180, 0),
    ]]
    fillet(fillet_3_edges, radius=FILLET_3_R)

    # 草图12 → 切除-拉伸8 (cut)
    with BuildSketch(Plane(origin=(0, 0, -2.5), x_dir=(-1, 0, 0), z_dir=(0, 0, -1))):
        with Locations((0, -180)):
            Circle(SKETCH_12_R)
    extrude(amount=-CUT_EXTRUDE_8_DEPTH, mode=Mode.SUBTRACT)

    # 草图13 → 切除-拉伸9 (cut)
    with BuildSketch(Plane.XY.offset(8)):
        Polygon((-1.58771324, -177.25), (-3.175426481, -180), (-1.58771324, -182.75), (1.58771324, -182.75), (3.175426481, -180), (1.58771324, -177.25), align=None)
    extrude(amount=-CUT_EXTRUDE_9_DEPTH, mode=Mode.SUBTRACT)


solid = part.part
